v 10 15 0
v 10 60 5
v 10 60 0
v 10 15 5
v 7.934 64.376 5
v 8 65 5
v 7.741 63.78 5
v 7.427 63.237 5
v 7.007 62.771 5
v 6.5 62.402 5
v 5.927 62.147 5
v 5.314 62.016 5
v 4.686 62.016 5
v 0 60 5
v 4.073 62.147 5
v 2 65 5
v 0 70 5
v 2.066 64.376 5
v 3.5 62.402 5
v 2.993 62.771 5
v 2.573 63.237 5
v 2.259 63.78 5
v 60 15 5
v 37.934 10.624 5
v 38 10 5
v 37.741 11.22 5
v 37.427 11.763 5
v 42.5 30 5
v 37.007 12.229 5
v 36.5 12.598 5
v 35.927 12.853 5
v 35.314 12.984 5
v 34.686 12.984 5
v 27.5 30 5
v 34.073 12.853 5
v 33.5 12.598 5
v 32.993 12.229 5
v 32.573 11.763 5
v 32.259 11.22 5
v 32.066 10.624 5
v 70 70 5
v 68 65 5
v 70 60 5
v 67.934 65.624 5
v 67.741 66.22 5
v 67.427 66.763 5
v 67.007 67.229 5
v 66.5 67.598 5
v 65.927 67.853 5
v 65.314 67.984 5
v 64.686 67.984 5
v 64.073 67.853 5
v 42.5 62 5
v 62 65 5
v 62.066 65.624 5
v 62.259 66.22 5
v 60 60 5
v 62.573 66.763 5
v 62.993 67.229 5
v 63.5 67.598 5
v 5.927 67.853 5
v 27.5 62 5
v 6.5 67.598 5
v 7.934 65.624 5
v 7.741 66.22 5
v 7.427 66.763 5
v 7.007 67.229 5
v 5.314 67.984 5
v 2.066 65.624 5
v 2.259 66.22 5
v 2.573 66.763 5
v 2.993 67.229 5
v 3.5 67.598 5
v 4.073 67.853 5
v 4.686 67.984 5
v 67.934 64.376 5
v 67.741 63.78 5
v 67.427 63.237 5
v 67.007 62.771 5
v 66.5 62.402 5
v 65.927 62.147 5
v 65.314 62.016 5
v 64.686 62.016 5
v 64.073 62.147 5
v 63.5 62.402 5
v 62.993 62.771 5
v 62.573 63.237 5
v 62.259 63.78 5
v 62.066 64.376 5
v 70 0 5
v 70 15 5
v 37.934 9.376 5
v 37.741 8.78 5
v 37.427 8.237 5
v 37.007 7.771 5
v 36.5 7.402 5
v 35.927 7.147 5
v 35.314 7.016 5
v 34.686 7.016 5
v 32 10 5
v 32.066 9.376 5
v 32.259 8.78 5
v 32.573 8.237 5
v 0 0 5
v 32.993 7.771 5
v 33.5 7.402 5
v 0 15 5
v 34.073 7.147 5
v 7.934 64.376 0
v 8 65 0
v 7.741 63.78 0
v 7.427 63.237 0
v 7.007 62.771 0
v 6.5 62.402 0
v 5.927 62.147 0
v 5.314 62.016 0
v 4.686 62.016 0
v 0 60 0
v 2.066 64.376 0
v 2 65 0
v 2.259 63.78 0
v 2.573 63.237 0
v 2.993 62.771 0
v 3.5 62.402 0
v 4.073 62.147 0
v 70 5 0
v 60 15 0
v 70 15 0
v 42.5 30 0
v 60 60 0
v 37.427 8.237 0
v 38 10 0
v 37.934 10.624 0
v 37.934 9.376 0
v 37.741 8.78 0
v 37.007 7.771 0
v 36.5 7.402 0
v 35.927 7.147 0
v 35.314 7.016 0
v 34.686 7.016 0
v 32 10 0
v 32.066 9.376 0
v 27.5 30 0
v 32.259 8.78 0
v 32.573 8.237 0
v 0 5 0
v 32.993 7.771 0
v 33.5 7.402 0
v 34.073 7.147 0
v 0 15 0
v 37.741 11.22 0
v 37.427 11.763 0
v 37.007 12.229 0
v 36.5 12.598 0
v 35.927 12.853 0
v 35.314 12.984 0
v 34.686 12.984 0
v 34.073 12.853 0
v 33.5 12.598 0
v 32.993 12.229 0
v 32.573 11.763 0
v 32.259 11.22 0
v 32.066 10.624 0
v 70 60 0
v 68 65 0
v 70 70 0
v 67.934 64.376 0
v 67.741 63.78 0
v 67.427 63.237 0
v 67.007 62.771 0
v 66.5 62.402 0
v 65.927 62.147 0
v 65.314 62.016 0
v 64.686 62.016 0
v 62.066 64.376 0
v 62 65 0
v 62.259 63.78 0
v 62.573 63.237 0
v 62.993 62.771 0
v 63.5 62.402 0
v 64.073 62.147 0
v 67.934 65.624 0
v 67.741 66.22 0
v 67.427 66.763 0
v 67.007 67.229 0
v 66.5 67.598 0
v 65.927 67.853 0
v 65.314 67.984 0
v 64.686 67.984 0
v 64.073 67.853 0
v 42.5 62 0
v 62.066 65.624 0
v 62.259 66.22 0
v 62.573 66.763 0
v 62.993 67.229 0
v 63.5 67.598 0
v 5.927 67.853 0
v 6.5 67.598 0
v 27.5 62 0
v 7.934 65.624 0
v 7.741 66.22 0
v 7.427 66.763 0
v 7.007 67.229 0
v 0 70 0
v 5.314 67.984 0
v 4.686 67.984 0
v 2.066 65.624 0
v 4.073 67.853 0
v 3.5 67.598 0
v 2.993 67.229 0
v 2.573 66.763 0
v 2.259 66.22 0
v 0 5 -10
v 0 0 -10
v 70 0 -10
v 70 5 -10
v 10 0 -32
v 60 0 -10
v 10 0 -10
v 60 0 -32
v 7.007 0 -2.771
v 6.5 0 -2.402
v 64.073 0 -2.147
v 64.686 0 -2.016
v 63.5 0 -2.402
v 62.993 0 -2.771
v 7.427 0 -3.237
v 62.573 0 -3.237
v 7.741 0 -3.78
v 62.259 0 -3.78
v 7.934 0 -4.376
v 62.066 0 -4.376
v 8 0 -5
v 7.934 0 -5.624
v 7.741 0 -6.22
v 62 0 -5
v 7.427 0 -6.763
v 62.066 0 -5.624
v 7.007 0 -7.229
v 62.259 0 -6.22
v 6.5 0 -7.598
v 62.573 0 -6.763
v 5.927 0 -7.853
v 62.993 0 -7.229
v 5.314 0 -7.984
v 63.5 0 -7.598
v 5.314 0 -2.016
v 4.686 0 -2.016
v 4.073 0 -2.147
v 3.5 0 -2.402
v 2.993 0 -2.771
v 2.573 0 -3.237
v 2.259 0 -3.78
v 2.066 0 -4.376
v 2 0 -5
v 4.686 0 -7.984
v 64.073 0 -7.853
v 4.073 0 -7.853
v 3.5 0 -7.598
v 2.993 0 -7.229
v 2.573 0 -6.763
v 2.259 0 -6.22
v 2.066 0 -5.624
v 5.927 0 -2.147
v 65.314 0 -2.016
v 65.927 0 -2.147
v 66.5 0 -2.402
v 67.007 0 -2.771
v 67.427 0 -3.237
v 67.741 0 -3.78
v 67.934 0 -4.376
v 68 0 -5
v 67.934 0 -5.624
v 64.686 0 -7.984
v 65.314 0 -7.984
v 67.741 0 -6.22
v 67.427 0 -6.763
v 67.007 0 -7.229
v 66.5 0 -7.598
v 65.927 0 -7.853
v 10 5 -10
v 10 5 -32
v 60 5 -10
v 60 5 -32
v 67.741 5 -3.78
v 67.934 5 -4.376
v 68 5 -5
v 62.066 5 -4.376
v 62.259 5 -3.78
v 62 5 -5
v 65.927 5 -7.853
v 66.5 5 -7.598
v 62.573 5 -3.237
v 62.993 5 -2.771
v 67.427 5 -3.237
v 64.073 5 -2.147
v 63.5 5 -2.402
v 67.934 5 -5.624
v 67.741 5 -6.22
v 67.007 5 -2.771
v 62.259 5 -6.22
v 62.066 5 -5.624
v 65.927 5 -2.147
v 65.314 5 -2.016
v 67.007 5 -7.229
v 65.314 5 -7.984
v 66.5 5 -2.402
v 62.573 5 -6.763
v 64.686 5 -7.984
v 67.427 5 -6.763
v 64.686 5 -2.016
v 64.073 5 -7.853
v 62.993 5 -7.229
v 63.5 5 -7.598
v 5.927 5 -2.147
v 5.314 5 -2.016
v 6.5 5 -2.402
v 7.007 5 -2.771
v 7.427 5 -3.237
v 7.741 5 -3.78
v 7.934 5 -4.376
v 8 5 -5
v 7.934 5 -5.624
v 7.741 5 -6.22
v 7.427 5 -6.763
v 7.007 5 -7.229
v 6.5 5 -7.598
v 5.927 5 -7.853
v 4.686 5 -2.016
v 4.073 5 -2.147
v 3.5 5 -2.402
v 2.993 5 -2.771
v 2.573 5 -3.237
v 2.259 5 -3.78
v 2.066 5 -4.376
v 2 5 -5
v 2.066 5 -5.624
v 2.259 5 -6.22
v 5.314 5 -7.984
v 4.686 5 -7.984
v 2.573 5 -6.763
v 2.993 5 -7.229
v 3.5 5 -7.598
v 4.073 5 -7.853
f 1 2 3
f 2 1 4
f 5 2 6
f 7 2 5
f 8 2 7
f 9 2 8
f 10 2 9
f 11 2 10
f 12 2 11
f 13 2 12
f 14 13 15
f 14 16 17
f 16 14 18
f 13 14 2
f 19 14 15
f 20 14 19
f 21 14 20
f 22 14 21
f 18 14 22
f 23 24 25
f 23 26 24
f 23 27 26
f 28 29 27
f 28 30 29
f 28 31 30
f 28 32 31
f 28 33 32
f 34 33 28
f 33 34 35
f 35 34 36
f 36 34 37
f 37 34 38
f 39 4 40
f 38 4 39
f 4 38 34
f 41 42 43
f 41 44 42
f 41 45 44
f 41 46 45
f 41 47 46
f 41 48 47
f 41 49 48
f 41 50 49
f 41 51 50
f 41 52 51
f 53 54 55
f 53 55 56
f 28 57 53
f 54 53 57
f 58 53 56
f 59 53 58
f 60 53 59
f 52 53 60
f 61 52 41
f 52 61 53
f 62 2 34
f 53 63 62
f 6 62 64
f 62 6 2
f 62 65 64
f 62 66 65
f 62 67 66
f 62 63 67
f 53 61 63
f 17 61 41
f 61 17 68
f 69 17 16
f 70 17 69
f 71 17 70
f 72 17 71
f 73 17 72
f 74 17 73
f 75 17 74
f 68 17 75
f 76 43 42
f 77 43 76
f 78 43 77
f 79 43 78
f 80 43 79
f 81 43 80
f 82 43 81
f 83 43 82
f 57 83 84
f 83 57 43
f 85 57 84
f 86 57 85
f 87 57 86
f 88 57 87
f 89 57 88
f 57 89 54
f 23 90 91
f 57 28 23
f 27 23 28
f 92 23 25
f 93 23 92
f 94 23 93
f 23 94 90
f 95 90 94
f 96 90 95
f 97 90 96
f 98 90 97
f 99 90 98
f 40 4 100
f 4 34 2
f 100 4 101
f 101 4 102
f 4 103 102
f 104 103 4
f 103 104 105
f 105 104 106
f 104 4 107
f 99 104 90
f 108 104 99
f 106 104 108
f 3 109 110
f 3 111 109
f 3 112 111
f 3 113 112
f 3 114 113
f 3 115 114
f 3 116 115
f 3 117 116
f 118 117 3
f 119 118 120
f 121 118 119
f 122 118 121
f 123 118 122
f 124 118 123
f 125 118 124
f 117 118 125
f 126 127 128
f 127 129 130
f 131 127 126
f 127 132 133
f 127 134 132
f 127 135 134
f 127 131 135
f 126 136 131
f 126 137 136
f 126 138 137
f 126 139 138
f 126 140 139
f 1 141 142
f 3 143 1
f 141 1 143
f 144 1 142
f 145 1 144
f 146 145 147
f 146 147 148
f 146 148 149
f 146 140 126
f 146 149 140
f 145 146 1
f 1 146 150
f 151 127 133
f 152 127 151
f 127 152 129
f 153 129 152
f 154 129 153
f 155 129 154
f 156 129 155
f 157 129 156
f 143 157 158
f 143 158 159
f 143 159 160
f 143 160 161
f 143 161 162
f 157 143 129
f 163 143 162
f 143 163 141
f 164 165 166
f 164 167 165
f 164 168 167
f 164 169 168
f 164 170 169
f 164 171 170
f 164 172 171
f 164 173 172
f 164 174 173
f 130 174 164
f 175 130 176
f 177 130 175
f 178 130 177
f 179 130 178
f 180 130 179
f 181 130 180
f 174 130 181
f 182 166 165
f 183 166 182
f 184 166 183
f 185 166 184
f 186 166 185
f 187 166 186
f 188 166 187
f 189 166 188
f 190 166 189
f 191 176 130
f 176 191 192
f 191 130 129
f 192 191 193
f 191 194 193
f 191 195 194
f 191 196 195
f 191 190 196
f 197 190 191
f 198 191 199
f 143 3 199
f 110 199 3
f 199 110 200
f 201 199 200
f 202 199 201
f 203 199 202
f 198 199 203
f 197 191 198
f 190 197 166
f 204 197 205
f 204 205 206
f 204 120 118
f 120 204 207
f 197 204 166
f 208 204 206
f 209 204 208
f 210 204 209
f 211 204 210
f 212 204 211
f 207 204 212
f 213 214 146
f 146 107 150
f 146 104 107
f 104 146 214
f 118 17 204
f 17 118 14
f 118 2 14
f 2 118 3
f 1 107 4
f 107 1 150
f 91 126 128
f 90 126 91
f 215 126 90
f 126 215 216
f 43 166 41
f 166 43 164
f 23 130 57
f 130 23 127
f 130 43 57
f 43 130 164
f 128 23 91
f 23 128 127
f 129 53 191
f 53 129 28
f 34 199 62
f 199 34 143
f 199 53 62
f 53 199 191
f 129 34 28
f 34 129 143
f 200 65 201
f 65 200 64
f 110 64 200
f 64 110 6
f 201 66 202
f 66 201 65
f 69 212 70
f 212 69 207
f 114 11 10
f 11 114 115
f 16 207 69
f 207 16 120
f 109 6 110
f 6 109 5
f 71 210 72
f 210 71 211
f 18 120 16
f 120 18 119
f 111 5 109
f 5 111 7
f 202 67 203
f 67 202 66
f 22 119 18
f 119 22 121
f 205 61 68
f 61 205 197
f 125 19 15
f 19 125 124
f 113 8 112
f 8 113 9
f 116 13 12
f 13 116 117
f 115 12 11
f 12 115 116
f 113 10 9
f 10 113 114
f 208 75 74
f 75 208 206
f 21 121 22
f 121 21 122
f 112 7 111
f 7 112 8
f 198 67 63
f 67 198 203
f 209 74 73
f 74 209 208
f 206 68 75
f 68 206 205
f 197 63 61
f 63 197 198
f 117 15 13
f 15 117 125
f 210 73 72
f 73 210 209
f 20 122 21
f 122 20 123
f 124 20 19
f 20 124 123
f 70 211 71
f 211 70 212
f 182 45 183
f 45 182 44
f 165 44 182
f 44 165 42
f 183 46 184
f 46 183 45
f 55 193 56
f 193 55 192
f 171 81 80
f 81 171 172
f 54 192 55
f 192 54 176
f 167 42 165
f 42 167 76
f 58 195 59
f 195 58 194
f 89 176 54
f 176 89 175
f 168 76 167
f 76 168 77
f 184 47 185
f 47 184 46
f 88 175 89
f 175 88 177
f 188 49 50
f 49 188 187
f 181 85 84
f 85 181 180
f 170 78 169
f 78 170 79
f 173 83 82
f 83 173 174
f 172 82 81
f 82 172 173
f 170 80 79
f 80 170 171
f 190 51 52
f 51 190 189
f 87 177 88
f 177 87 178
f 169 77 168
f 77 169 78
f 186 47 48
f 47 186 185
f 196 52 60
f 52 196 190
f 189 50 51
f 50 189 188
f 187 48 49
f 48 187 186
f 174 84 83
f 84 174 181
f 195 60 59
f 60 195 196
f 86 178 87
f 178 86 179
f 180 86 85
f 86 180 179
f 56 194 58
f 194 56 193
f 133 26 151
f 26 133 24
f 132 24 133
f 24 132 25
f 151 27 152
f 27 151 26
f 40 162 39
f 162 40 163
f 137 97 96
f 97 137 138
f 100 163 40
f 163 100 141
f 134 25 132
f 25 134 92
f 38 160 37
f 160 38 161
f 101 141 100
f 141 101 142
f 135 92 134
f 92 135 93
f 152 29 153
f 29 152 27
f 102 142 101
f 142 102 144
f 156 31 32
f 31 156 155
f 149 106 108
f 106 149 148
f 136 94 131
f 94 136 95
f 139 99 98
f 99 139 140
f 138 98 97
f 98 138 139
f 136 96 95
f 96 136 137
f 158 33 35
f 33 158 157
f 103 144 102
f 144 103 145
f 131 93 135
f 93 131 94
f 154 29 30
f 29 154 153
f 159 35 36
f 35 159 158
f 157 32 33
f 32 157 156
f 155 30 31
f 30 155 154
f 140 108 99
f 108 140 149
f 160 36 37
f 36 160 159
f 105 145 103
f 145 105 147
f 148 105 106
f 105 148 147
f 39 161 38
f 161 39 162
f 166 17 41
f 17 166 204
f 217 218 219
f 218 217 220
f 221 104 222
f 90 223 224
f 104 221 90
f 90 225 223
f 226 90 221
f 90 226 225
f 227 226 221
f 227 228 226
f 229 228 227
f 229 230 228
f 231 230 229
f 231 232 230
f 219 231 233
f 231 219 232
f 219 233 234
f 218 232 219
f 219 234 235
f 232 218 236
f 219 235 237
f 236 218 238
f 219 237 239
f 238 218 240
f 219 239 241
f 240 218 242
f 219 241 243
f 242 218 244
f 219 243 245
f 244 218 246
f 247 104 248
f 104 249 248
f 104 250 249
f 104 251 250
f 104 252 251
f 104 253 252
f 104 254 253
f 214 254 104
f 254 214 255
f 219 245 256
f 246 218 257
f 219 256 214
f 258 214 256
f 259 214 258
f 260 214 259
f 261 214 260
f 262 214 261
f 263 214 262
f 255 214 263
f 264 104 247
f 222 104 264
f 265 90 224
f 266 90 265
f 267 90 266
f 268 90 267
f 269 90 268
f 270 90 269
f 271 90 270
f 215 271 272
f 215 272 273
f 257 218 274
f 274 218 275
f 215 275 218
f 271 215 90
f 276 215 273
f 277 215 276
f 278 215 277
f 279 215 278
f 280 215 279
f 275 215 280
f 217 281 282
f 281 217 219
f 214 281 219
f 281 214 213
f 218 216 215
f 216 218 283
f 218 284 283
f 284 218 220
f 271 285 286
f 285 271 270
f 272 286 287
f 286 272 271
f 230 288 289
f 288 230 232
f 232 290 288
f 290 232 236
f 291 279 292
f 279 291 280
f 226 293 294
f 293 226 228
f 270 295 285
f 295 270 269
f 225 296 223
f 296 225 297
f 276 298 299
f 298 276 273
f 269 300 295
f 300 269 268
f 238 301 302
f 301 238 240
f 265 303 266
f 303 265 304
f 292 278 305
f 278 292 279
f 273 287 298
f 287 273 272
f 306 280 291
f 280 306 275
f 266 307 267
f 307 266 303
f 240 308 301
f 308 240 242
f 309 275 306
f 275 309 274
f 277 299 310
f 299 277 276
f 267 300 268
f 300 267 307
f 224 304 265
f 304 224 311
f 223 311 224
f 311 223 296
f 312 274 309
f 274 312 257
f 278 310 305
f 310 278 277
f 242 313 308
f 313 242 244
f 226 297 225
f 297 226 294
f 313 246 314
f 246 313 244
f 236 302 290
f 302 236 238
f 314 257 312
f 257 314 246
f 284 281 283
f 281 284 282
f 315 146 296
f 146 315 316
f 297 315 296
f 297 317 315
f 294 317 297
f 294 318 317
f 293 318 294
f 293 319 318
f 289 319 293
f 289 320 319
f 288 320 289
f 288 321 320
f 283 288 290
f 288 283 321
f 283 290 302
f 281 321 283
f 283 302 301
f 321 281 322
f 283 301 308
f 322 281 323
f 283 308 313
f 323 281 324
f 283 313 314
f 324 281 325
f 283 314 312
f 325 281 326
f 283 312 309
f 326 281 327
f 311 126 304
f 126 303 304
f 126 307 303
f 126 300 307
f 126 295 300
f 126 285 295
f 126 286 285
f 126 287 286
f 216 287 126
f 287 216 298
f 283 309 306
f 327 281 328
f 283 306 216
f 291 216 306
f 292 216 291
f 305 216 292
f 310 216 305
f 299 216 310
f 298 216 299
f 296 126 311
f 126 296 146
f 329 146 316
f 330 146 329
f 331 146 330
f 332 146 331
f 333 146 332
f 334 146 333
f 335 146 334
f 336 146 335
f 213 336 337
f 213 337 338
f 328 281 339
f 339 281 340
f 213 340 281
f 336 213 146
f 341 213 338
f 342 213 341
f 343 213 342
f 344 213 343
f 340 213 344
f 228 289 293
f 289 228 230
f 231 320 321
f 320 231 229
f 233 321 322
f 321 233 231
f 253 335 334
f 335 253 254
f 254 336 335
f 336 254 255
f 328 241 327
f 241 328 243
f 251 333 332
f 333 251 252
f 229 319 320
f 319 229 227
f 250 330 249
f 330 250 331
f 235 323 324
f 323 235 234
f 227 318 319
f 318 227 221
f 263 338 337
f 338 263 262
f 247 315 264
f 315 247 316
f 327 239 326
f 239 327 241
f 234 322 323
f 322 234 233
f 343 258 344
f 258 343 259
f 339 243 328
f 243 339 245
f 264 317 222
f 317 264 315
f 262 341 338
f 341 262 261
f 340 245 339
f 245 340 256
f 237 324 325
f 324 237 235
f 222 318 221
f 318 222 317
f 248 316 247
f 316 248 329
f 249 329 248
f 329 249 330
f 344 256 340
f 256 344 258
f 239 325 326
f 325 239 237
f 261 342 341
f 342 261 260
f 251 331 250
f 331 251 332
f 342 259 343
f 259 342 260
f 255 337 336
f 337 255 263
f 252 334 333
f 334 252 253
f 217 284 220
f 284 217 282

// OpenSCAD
$fn = 30; // number of faces in screw holes

thickness = 5; // thickness, this doesnt work

// main body
width = 70;
depth = 70;
height = 32;

// servo
sWidth = 15;
sDepth = 32;
sHeight = 5;

cWidth = 10; // cutout width

aDiameter = 6; // axel diameter

sDiameter = 6; // screw diameter

// top surface
difference()
{
    // main
    cube([width, depth, thickness]);    
    
      union()
    {
        // edge cutout
        translate([0, 10+thickness, 0])
        cube([cWidth, 45, thickness]);
        
         // edge cutout
        translate([width-cWidth, 10+thickness, 0])
        cube([cWidth, 45, thickness]);
        
        // servo hole
        translate([(width/2)-(sWidth/2), 30, 0])
        cube([sWidth, sDepth, sHeight]);
        
        // screw holes
        
        // upper left
        translate([cWidth/2, width-cWidth/2, 0])
        cylinder(h=thickness, d=sDiameter);
        // upper right
        translate([depth-cWidth/2, width-cWidth/2, 0])
        cylinder(h=thickness, d=sDiameter);
        
        // rudder axel hole
        translate([width/2, 10, 0])
        cylinder(h = thickness, r = aDiameter/2);
    }
}


// side surface
difference()
{
    // main
    translate([0, 0, -height])
    cube([width, thickness, height]);
    
    union()
    {
        // edge cutout
        translate([0, 0, -(height+5)])
        cube([cWidth, 10, 27]);
        
         // edge cutout
        translate([width-cWidth, 0, -(height+5)])
        cube([cWidth, 10, 27]);
        
        // lower right
        translate([depth-cWidth/2, cWidth/2, -5])
        rotate([90, 0, 0])
        cylinder(h=thickness, d=sDiameter);
        
        // lower left
        translate([cWidth/2, cWidth/2, -5])
        rotate([90, 0, 0])
        cylinder(h=thickness, d=sDiameter);
        
    }
    
}
